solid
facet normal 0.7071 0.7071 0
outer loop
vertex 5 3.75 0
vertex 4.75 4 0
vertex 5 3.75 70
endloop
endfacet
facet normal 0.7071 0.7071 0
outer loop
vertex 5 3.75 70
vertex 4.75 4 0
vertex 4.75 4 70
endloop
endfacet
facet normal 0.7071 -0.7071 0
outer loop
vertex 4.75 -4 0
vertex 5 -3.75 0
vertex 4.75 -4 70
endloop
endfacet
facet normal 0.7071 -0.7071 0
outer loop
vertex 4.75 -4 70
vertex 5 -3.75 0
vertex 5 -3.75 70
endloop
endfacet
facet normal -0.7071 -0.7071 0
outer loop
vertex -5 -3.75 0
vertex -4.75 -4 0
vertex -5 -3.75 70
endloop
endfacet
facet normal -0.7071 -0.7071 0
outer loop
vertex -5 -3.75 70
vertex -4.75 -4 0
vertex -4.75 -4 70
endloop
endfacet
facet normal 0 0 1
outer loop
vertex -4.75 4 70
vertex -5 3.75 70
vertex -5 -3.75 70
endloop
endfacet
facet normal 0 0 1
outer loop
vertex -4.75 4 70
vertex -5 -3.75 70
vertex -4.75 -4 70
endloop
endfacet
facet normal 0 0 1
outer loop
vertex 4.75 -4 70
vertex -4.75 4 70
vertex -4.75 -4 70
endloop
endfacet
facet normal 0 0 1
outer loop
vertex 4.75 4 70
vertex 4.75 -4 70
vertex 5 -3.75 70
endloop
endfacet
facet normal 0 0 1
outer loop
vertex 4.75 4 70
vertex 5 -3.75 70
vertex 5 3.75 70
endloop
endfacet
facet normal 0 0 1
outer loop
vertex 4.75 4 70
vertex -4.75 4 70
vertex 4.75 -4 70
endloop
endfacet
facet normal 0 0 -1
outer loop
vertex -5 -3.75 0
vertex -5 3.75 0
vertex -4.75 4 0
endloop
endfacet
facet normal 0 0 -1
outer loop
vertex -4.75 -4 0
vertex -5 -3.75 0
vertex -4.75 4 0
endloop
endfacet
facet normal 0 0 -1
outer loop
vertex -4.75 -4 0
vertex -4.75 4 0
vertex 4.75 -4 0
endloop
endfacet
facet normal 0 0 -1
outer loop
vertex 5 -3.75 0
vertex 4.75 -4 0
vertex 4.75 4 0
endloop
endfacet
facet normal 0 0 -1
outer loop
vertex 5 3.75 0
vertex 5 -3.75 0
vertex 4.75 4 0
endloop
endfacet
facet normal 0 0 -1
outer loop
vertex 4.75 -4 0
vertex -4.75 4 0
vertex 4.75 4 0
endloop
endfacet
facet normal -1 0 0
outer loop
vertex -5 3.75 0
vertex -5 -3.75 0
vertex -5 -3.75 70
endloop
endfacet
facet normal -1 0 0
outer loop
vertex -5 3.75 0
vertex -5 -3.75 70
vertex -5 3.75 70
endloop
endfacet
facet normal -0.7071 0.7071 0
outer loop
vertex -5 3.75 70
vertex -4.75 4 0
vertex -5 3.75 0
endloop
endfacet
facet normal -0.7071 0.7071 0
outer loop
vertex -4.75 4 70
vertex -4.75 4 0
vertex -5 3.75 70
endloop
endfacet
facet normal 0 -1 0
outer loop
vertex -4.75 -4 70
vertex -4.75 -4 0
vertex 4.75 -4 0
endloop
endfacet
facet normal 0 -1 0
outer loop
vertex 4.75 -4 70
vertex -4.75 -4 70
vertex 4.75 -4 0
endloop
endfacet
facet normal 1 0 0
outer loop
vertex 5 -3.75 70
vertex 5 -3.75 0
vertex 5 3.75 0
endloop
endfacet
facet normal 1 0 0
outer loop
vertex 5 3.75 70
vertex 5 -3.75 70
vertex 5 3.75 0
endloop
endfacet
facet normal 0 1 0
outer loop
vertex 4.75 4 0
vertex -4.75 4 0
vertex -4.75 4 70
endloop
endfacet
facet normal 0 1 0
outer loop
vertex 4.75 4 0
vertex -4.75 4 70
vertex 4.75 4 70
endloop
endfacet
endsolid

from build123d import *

# Parameters (mm, degrees)
SKETCH1_W      = 10
SKETCH1_H      = 8
EXTRUDE1_DEPTH = 70
CHAMFER1_SIZE  = 0.25


with BuildPart() as part:
    # Sketch1 → Extrude1 (new body)
    with BuildSketch(Plane.XY):
        Rectangle(SKETCH1_W, SKETCH1_H)
    extrude(amount=EXTRUDE1_DEPTH)

    # Chamfer1
    chamfer1_edges = [part.edges().sort_by_distance(p)[0] for p in [
        (5, -4, 35),
        (-5, -4, 35),
        (-5, 4, 35),
        (5, 4, 35),
    ]]
    chamfer(chamfer1_edges, length=CHAMFER1_SIZE)


solid = part.part
